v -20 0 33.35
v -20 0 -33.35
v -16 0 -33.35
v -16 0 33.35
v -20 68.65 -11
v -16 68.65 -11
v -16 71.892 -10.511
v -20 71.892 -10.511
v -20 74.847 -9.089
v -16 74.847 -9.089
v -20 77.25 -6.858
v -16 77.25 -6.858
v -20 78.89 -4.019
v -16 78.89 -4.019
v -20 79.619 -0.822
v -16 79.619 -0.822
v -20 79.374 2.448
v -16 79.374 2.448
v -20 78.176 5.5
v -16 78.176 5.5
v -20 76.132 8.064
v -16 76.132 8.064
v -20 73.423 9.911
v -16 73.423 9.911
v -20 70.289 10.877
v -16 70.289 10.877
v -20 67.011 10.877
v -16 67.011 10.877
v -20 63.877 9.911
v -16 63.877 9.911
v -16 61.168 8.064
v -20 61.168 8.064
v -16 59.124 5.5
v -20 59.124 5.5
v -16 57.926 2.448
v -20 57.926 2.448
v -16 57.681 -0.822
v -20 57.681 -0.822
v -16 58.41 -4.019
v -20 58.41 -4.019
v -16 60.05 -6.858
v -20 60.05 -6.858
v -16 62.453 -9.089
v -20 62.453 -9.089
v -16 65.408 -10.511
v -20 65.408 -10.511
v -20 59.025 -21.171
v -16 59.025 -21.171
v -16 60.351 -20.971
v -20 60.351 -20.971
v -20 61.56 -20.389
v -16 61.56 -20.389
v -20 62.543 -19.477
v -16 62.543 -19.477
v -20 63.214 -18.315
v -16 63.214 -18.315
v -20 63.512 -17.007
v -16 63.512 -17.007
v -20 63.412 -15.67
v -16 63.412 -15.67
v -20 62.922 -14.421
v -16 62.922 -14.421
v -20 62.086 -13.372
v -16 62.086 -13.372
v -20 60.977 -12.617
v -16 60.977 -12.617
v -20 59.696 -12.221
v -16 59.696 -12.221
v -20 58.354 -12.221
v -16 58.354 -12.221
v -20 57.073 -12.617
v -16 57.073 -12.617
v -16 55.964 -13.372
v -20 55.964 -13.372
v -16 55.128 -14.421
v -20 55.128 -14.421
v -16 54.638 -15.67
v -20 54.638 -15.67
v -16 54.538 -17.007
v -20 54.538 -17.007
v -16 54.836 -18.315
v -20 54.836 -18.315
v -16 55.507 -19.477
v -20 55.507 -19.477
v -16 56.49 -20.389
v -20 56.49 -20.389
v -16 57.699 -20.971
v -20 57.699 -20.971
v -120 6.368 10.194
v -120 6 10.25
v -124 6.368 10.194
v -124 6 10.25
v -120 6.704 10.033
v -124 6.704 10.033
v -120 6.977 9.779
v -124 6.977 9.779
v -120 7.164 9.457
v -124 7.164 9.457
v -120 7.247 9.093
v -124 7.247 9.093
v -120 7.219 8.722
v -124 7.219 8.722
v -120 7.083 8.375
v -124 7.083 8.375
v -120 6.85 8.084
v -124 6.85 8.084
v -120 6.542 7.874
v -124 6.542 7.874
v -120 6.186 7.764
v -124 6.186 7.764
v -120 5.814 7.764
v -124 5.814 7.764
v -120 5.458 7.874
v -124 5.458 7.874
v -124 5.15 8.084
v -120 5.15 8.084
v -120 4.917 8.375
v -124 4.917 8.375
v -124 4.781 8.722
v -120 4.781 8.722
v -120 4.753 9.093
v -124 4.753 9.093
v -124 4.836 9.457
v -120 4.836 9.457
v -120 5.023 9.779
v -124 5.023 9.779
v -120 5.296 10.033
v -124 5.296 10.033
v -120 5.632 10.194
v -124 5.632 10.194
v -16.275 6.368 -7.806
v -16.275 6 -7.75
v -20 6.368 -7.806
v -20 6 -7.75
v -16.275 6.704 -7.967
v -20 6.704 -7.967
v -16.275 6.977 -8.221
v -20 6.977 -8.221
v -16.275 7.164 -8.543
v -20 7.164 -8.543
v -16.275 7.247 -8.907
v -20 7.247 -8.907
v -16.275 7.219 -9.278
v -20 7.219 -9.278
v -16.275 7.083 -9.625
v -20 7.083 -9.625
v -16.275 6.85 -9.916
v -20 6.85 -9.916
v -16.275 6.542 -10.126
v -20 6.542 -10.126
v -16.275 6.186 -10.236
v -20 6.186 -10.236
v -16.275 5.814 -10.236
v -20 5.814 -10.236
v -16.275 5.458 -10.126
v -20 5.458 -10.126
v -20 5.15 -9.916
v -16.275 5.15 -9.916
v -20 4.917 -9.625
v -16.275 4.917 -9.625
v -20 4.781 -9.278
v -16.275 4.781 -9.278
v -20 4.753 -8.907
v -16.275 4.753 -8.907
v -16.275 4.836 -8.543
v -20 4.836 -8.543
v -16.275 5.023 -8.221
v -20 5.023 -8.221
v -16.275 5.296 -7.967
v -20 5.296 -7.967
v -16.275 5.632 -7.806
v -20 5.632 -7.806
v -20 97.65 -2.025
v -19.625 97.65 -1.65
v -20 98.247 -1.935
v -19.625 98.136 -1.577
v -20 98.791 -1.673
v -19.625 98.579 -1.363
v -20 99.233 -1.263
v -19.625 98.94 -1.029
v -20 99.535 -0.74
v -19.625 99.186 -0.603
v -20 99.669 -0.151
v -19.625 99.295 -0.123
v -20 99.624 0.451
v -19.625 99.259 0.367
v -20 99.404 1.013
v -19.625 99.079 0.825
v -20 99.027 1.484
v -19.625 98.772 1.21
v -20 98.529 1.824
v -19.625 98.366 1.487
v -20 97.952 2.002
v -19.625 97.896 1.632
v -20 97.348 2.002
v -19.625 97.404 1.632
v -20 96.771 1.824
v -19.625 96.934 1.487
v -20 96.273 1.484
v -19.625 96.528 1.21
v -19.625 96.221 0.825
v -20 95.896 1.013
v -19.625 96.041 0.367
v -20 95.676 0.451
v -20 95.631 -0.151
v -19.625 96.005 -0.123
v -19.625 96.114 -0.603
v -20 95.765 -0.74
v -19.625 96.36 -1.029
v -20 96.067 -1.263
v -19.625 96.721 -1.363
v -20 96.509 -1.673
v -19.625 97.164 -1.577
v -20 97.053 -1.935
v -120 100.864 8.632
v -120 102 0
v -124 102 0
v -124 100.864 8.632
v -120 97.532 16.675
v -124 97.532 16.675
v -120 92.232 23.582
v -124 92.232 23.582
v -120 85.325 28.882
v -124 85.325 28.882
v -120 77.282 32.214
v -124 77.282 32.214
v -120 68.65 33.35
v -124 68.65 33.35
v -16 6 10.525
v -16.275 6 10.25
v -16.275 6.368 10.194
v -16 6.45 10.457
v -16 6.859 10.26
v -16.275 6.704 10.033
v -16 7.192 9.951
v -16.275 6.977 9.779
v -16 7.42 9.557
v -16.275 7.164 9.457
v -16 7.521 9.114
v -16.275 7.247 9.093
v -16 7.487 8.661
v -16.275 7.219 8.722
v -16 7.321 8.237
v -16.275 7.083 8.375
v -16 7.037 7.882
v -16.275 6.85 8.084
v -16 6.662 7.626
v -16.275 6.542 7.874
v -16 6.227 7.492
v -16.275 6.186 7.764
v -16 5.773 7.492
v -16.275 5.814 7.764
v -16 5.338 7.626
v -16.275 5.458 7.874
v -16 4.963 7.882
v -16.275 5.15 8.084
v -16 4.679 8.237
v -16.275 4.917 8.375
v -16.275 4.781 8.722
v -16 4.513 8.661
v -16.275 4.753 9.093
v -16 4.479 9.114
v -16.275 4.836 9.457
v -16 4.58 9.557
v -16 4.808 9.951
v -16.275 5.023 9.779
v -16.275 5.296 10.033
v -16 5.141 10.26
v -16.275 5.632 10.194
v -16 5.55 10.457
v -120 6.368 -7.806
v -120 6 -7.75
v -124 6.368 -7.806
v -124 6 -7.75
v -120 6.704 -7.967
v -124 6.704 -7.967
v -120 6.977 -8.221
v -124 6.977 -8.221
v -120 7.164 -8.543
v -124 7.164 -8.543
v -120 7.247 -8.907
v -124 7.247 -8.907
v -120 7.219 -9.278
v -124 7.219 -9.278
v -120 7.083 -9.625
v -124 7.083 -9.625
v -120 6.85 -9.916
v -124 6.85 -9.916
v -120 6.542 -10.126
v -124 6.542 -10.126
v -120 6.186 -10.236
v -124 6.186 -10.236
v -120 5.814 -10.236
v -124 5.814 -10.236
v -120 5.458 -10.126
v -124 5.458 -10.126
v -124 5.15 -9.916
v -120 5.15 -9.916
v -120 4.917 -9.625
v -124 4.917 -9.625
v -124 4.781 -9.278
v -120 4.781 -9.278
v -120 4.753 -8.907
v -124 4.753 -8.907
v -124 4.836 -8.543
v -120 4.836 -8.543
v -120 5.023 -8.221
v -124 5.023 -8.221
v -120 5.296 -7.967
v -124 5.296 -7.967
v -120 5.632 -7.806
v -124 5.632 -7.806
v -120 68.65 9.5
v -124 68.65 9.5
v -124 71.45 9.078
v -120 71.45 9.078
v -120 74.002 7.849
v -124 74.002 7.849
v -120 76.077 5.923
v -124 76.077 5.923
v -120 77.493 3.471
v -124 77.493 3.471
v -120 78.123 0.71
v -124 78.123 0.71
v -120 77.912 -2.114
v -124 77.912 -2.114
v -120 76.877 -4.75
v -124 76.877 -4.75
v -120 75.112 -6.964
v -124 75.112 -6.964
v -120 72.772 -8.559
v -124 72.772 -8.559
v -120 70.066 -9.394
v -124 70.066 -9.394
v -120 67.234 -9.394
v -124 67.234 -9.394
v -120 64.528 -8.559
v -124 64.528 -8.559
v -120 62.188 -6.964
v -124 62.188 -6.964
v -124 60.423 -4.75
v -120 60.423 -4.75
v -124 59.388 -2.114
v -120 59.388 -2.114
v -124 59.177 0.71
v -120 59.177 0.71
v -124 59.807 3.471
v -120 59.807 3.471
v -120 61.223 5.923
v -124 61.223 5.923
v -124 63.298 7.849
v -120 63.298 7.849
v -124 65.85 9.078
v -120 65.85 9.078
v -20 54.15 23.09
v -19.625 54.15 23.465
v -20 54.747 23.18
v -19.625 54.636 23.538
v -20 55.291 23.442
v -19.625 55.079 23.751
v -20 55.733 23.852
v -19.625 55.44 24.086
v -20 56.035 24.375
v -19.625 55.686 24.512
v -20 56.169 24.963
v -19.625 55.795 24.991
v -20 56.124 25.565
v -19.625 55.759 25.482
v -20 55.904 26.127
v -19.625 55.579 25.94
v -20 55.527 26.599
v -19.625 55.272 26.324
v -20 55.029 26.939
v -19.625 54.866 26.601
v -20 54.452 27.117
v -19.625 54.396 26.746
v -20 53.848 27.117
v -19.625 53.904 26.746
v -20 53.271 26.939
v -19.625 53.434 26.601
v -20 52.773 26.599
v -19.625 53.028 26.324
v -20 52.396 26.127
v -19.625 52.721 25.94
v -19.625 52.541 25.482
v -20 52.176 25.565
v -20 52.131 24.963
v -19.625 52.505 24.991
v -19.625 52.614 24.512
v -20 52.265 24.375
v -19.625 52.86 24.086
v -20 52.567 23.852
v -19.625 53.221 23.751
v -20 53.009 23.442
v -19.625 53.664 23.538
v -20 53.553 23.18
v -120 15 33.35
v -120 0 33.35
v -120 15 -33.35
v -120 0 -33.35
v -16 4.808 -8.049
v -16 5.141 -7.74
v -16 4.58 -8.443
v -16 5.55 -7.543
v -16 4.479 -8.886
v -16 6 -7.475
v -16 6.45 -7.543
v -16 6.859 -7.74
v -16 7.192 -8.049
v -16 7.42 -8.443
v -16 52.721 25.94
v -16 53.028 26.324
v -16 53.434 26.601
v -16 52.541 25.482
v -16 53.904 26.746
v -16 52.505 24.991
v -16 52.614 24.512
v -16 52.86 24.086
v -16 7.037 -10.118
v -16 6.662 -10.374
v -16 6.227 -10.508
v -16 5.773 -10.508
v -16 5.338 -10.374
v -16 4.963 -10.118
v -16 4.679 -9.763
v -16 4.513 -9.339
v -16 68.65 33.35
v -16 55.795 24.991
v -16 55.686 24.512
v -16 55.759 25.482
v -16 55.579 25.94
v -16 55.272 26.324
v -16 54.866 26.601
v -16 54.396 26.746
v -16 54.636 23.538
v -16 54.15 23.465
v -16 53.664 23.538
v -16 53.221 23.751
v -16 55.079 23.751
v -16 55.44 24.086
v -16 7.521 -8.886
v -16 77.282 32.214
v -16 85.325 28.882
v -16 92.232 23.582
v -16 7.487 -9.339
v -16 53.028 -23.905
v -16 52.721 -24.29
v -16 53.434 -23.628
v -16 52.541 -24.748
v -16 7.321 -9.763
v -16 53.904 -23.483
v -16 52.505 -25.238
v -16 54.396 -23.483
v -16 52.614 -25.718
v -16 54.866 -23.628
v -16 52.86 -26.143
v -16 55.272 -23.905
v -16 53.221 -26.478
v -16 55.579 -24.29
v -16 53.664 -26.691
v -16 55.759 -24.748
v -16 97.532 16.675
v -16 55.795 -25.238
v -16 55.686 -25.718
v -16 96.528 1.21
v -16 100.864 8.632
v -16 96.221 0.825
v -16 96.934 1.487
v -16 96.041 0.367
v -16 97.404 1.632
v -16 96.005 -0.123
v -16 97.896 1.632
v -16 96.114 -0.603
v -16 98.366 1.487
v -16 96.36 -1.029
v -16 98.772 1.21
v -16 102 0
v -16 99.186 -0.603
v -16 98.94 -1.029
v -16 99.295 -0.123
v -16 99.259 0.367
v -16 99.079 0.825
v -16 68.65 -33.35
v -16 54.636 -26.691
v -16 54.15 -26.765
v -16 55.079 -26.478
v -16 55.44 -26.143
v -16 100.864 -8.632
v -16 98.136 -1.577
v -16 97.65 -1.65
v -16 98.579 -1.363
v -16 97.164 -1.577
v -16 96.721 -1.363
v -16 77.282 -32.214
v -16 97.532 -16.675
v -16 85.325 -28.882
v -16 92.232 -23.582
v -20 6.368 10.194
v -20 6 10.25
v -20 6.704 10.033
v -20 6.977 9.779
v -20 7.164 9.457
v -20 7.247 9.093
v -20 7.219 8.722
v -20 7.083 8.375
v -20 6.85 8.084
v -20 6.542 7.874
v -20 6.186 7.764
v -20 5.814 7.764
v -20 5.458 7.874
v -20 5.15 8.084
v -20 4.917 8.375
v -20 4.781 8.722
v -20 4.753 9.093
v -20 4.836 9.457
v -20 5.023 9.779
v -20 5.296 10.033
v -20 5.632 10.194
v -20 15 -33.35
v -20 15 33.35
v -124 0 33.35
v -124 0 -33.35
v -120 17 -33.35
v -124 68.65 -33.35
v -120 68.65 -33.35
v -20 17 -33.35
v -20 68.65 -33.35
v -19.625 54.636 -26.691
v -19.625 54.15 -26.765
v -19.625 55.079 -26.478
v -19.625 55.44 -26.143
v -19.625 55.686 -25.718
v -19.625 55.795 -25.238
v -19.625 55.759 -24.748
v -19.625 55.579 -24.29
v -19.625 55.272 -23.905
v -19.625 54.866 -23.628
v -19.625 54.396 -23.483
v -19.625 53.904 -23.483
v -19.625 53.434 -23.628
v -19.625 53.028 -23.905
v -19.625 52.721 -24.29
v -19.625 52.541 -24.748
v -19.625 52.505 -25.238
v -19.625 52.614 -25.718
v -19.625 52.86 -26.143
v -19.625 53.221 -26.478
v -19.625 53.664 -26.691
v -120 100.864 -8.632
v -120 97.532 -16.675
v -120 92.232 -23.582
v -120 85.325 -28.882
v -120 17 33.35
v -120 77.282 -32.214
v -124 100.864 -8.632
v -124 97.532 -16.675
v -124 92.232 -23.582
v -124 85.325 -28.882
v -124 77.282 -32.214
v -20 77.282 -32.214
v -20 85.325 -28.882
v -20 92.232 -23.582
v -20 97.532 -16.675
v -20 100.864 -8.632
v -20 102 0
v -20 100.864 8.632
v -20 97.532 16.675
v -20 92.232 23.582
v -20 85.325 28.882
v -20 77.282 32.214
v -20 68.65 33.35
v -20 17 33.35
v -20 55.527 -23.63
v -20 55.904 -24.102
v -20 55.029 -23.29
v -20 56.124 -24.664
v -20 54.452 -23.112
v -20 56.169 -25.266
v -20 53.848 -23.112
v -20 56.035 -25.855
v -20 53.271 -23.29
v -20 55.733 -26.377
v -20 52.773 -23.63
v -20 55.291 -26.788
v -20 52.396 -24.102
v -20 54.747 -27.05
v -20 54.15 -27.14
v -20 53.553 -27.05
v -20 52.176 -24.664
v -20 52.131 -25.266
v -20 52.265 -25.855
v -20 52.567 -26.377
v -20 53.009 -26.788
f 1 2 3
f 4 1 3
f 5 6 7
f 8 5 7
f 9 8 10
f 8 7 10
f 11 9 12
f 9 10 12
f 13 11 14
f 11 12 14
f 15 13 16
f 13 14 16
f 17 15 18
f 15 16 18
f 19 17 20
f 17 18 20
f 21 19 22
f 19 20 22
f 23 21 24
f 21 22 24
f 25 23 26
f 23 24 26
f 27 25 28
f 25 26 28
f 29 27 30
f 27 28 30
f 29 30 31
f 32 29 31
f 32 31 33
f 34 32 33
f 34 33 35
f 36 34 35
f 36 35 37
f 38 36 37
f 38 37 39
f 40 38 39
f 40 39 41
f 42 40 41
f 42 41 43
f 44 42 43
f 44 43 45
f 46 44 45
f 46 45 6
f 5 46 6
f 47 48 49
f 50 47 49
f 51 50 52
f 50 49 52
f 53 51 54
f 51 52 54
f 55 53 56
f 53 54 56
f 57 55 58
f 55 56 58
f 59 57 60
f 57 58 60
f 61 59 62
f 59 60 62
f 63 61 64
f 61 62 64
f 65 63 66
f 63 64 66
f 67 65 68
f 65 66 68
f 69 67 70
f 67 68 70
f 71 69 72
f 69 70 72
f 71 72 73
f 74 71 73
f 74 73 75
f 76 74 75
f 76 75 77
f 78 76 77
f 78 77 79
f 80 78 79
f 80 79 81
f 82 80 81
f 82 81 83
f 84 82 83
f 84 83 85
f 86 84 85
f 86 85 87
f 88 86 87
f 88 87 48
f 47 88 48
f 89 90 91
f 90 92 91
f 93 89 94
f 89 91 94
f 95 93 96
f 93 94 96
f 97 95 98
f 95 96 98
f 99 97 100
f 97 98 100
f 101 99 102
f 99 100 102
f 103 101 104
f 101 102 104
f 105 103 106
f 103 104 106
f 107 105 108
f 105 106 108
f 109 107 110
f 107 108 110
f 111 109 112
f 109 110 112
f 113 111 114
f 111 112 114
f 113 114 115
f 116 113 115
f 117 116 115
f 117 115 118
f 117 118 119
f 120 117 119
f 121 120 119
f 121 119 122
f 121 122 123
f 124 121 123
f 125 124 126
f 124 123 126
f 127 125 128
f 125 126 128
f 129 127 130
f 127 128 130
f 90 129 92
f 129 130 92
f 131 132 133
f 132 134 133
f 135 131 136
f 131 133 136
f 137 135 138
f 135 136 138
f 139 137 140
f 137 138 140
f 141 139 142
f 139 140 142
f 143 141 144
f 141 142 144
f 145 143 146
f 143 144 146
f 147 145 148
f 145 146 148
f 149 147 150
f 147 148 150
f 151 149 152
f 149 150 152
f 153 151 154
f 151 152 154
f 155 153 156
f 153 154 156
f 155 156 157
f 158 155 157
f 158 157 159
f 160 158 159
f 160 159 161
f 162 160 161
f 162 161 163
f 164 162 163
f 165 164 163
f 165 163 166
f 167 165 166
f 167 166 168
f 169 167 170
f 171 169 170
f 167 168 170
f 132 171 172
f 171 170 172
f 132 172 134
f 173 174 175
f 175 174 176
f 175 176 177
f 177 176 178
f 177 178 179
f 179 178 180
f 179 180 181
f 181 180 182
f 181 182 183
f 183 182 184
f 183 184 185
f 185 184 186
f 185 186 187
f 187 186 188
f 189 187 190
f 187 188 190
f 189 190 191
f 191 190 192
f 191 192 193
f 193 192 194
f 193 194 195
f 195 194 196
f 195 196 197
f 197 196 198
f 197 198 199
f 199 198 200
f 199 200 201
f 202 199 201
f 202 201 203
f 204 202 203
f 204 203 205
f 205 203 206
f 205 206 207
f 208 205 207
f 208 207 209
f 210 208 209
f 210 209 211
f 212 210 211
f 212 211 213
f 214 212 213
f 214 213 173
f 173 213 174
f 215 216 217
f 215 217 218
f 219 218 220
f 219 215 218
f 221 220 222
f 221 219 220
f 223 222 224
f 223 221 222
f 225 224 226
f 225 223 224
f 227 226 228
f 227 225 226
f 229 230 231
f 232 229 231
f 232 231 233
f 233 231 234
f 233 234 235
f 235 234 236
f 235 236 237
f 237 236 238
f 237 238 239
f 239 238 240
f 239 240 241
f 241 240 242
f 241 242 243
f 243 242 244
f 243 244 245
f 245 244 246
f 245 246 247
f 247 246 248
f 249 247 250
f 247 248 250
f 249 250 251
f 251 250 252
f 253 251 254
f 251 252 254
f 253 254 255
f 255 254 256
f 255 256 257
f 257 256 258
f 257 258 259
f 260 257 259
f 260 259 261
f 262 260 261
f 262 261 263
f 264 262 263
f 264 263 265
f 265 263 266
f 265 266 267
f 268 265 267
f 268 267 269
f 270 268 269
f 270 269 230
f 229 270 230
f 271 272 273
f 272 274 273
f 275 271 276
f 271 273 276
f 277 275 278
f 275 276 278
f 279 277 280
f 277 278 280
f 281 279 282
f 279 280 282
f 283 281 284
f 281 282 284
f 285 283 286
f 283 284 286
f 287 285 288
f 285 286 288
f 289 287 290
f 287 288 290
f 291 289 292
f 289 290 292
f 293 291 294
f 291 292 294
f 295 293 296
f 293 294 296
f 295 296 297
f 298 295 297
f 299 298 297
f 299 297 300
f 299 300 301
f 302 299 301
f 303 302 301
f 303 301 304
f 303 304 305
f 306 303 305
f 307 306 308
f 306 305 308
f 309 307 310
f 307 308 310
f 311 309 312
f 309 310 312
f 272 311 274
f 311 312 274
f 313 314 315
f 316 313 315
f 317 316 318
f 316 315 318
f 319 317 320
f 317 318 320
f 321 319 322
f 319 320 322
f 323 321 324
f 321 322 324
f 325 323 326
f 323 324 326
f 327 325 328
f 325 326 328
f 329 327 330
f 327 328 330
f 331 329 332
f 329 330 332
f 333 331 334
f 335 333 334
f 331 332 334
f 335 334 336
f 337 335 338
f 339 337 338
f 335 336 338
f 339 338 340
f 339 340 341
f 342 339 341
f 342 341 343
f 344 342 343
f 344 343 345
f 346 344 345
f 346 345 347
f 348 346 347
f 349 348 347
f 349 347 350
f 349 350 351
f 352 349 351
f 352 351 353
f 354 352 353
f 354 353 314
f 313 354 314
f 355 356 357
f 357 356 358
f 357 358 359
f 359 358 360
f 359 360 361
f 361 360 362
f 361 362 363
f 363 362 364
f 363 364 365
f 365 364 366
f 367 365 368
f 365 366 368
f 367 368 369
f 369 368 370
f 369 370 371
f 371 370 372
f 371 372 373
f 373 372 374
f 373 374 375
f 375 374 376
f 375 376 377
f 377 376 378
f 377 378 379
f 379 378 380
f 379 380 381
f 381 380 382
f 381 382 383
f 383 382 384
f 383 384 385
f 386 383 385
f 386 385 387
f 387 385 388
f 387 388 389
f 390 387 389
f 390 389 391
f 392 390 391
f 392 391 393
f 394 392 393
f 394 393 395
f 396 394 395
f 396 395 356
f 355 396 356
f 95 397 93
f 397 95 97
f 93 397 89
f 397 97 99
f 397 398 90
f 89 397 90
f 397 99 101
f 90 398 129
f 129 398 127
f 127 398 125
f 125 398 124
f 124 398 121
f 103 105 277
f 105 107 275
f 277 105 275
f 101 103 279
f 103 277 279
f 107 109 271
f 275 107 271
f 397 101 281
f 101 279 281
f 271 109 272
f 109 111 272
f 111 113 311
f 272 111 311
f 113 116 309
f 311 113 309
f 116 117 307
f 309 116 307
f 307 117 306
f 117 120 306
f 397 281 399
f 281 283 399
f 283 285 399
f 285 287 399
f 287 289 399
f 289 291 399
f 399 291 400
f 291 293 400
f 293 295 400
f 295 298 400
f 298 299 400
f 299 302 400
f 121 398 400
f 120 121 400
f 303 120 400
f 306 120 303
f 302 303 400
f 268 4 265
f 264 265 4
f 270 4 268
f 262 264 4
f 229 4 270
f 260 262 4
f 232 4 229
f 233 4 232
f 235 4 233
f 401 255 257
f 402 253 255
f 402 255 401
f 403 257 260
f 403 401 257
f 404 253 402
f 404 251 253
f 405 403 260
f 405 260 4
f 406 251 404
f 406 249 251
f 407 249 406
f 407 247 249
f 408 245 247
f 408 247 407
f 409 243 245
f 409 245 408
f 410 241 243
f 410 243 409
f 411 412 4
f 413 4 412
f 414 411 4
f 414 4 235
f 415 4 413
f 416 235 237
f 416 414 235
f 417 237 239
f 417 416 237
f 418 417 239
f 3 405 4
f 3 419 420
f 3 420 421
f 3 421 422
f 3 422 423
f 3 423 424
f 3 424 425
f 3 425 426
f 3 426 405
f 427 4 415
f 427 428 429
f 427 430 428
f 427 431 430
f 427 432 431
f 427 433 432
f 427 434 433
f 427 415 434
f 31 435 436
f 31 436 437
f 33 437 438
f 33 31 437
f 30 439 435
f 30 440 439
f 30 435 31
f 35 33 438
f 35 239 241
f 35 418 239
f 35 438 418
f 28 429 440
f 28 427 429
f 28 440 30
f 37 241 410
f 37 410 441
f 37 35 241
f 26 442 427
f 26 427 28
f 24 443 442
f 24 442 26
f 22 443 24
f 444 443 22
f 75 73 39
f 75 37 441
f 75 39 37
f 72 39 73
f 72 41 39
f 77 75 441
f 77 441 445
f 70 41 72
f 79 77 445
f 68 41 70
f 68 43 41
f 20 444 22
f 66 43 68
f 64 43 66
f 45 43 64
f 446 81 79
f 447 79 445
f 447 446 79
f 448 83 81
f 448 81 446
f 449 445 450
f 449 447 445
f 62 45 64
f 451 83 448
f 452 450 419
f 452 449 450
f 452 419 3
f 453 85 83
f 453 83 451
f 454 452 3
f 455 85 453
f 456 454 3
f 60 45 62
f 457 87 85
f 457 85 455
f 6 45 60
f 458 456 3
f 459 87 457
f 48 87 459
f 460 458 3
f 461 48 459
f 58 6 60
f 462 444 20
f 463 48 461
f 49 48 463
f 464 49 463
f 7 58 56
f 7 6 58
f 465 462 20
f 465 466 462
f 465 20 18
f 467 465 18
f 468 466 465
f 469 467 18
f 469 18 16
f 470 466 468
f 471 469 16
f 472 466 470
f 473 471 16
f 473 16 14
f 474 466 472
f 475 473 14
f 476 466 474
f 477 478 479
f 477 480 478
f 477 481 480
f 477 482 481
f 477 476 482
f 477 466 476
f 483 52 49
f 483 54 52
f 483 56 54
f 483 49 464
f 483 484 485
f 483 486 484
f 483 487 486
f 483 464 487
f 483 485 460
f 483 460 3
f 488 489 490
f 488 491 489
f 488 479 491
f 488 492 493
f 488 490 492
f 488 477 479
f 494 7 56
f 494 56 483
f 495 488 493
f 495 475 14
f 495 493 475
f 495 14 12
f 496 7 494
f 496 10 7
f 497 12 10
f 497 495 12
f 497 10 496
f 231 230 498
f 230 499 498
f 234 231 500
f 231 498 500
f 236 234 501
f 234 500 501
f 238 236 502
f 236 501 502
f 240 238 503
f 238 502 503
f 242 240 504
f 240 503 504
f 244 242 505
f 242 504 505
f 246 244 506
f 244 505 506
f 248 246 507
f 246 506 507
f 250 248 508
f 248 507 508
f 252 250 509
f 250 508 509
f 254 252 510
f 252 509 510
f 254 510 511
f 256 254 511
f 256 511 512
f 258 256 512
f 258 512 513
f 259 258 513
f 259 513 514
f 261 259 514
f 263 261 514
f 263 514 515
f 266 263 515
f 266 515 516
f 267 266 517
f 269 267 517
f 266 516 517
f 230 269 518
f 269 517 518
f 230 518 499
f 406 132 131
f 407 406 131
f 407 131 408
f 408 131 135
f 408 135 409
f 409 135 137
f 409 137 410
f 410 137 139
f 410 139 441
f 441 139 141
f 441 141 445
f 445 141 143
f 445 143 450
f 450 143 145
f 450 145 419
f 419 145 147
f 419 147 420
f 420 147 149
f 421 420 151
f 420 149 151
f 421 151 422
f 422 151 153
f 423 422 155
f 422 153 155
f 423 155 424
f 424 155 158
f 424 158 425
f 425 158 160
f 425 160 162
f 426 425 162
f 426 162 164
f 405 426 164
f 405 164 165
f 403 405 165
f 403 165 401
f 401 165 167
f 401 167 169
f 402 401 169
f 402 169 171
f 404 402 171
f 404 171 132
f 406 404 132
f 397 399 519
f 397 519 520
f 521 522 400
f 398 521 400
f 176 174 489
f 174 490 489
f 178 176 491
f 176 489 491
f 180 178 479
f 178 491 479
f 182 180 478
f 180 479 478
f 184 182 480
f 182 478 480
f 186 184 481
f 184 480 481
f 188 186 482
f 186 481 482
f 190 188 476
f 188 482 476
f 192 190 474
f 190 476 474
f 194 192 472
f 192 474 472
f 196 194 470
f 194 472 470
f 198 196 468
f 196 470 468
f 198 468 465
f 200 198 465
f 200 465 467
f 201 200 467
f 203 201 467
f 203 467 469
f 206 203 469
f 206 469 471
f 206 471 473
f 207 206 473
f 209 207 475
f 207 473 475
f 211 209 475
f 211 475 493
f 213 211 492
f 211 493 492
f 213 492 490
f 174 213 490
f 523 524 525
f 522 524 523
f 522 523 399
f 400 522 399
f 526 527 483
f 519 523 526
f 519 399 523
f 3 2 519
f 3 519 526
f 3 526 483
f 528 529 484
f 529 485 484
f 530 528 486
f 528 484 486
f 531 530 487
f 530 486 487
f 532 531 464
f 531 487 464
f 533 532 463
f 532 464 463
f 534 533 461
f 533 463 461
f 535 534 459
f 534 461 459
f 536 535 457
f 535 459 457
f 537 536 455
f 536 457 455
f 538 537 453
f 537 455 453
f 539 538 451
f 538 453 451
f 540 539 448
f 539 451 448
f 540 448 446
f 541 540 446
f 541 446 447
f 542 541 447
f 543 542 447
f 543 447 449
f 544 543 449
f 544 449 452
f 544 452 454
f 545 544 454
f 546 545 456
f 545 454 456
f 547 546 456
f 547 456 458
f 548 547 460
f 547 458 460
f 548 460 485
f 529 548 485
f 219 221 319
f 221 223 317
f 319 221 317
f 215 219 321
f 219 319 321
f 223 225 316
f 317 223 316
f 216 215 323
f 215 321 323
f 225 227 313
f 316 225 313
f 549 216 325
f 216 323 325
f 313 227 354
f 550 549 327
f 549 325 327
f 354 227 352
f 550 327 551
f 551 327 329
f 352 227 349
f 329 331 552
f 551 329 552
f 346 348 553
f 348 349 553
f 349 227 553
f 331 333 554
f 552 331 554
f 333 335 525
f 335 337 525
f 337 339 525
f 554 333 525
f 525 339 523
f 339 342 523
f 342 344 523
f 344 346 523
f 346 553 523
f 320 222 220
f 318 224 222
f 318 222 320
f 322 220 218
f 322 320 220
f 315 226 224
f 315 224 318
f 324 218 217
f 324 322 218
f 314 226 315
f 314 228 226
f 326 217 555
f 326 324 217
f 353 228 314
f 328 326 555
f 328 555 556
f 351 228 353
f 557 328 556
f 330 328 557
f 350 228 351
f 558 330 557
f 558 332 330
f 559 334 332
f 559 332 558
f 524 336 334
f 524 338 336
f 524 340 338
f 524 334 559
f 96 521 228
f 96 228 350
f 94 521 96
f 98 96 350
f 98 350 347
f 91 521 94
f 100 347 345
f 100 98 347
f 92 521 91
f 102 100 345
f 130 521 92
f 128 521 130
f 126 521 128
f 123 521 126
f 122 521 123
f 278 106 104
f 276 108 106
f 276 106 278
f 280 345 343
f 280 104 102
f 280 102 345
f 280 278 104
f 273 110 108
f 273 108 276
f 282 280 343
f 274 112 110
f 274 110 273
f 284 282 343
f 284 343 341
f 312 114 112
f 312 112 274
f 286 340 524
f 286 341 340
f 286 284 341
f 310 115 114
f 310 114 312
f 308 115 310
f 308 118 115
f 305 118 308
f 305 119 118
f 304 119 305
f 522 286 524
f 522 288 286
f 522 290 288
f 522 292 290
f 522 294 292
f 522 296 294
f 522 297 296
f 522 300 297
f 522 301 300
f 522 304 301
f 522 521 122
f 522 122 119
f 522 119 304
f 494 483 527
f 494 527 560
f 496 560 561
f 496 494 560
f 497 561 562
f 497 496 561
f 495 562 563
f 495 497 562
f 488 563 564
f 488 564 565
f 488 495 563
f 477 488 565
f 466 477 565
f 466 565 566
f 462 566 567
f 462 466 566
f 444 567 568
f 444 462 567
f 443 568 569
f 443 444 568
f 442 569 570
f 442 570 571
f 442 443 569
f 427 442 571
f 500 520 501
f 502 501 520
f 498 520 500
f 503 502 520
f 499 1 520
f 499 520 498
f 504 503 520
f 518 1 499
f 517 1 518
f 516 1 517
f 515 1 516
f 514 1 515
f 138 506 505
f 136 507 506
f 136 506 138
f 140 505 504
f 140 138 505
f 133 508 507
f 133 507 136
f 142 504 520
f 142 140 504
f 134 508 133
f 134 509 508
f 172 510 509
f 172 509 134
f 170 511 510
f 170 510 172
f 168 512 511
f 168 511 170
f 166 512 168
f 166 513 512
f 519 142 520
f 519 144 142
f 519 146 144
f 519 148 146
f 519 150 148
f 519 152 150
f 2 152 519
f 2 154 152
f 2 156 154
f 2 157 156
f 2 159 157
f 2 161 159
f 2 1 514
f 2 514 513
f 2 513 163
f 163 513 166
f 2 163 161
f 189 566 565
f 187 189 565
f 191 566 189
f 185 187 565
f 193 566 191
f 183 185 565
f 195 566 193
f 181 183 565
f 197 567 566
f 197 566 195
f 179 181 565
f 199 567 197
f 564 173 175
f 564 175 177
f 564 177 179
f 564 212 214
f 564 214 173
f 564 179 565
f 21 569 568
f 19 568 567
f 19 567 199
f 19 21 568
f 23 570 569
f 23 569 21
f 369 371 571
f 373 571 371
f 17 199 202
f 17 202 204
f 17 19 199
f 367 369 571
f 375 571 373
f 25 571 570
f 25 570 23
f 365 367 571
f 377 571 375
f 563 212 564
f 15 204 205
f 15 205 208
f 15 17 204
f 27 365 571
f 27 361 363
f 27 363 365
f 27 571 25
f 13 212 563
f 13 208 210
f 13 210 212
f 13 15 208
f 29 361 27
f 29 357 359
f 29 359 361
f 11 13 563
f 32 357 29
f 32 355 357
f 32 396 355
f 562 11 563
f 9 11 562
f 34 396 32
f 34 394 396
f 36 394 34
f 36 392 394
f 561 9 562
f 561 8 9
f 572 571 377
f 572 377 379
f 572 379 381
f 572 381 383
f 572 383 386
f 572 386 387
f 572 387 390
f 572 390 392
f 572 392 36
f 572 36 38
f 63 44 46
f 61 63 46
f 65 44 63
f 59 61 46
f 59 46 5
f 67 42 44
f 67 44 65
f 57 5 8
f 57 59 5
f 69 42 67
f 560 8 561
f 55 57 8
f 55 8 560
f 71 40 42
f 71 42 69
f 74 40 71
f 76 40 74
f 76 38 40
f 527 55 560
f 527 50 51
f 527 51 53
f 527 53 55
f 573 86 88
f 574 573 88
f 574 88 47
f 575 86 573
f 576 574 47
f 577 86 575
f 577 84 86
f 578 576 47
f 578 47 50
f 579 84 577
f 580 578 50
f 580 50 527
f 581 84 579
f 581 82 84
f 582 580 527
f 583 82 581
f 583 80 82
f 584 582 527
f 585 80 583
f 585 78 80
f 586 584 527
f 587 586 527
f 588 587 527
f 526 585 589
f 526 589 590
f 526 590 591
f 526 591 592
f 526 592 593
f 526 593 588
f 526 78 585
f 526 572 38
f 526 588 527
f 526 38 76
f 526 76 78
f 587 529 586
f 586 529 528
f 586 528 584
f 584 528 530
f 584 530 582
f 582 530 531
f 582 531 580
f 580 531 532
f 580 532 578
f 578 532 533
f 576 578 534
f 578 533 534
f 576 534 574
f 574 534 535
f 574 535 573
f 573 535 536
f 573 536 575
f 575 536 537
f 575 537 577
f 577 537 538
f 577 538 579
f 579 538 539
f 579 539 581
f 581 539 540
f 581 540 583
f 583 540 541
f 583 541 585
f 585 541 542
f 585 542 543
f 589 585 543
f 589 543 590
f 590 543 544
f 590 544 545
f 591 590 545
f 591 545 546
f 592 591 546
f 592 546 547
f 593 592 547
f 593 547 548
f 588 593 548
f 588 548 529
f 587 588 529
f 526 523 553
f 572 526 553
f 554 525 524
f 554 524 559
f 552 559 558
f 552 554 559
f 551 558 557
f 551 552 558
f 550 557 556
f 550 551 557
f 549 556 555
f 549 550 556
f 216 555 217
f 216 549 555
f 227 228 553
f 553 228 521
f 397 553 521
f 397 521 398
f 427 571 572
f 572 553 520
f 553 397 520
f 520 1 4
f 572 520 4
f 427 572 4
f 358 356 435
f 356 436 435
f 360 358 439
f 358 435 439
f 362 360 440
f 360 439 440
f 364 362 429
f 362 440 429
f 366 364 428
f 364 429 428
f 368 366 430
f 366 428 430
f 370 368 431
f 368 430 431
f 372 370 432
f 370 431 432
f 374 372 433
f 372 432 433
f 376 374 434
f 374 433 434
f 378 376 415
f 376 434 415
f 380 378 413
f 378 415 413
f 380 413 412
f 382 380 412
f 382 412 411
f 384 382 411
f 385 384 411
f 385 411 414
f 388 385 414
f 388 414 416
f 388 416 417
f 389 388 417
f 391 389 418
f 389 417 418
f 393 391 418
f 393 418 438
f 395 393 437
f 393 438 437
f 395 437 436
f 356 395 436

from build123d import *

# Parameters (mm, degrees)
SKETCH_1_W                   = 40
SKETCH_1_H                   = 66.7
EXTRUDE_1_DEPTH              = 2
SKETCH_2_W                   = 4
SKETCH_2_H                   = 66.7
EXTRUDE_2_DEPTH              = 100
CUT_EXTRUDE_1_DEPTH          = 115.526077816
CUT_EXTRUDE_1_DEPTH_BACK     = 115.526077816
HOLE_WIZARD_M4_1_D           = 3.3
HOLE_WIZARD_M4_1_CSINK_D     = 4.05
HOLE_WIZARD_M4_1_CSINK_ANGLE = 90
HOLE_WIZARD_M4_2_AT_2_COUNT  = 2
HOLE_WIZARD_M4_2_AT_2_PITCH  = 68.59294731
HOLE_WIZARD_M4_2_AT_3_COUNT  = 2
HOLE_WIZARD_M4_2_AT_3_PITCH  = 26
HOLE_WIZARD_M4_2_AT_4_COUNT  = 2
HOLE_WIZARD_M4_2_AT_4_PITCH  = 62.376998966
HOLE_WIZARD_M4_2_AT_5_COUNT  = 2
HOLE_WIZARD_M4_2_AT_5_PITCH  = 56.7
SKETCH_11_W                  = 66.7
SKETCH_11_H                  = 2
EXTRUDE_3_DEPTH              = 100
SKETCH_13_W                  = 40
SKETCH_13_H                  = 66.7
EXTRUDE_4_DEPTH              = 2
SKETCH_14_W                  = 4
SKETCH_14_H                  = 66.7
EXTRUDE_5_DEPTH              = 100
CUT_EXTRUDE_2_DEPTH          = 180.589037806
CUT_EXTRUDE_2_DEPTH_BACK     = 180.589037806
HOLE_WIZARD_M4_3_AT_2_COUNT  = 2
HOLE_WIZARD_M4_3_AT_2_PITCH  = 26
HOLE_WIZARD_M4_3_AT_3_COUNT  = 2
HOLE_WIZARD_M4_3_AT_3_PITCH  = 62.376998966
HOLE_WIZARD_M4_3_AT_4_COUNT  = 2
HOLE_WIZARD_M4_3_AT_4_PITCH  = 56.7
CUT_EXTRUDE_3_REACH          = 181.589
SKETCH_18_R                  = 9.5
CUT_EXTRUDE_4_REACH          = 181.589
SKETCH_21_R                  = 11
CUT_EXTRUDE_5_REACH          = 181.589
SKETCH_22_R                  = 4.5
FILLET_1_R                   = 2
CUT_EXTRUDE_6_REACH          = 193.604
SKETCH_23_W                  = 36
SKETCH_23_H                  = 66.7
CUT_EXTRUDE_7_REACH          = 164.752
SKETCH_24_W                  = 36
SKETCH_24_H                  = 66.7
HOLE_WIZARD_M3_1_D           = 2.5
HOLE_WIZARD_M3_1_CSINK_D     = 3.05
HOLE_WIZARD_M3_1_CSINK_ANGLE = 90


with BuildPart() as part:
    # 草图1 → 凸台-拉伸1 (new body)
    with BuildSketch(Plane(origin=(0, 0, 0), x_dir=(1, 0, 0), z_dir=(0, 1, 0))):
        Rectangle(SKETCH_1_W, SKETCH_1_H)
    extrude(amount=EXTRUDE_1_DEPTH)

    # 草图2 → 凸台-拉伸2 (add)
    with BuildSketch(Plane(origin=(0, 2, 0), x_dir=(1, 0, 0), z_dir=(0, 1, 0))):
        with Locations((-18, 0)):
            Rectangle(SKETCH_2_W, SKETCH_2_H)
    extrude(amount=EXTRUDE_2_DEPTH)

    # 草图5 → 切除-拉伸1 (cut, two sides: drawn at the far end of the back side and taken through both)
    with BuildSketch(Plane.ZY.offset(20).offset(-CUT_EXTRUDE_1_DEPTH_BACK)):
        with BuildLine():
            ThreePointArc((0, 102), (23.582011153, 92.232011153), (33.35, 68.65))
            Line((33.35, 68.65), (33.35, 102))
            Line((33.35, 102), (0, 102))
        make_face()
        with BuildLine():
            ThreePointArc((-33.35, 68.65), (-23.582011153, 92.232011153), (0, 102))
            Line((0, 102), (-33.35, 102))
            Line((-33.35, 102), (-33.35, 68.65))
        make_face()
    extrude(amount=CUT_EXTRUDE_1_DEPTH + CUT_EXTRUDE_1_DEPTH_BACK, mode=Mode.SUBTRACT)

    # M4 螺纹孔1 (through all)
    with Locations(Plane.ZY.offset(20)):
        with Locations((0, 97.65), (25.11473671, 54.15), (-25.11473671, 54.15)):
            CounterSinkHole(HOLE_WIZARD_M4_1_D / 2, HOLE_WIZARD_M4_1_CSINK_D / 2, counter_sink_angle=HOLE_WIZARD_M4_1_CSINK_ANGLE)

    # 草图10 → M4 螺纹孔2 (revolve, cut)
    with BuildSketch(Plane(origin=(15, 2, -28.35), x_dir=(0, 0, 1), z_dir=(1, 0, 0))):
        Polygon((0, 0), (0, 2), (1.65, 2), (1.65, 0.375), (2.025, 0), align=None)
    hole_wizard_m4_2 = revolve(axis=Axis((15, 8.35, -28.35), (0, -1, 0)), mode=Mode.SUBTRACT)

    # M4 螺纹孔2 at 2: M4 螺纹孔2 ×2
    with Locations(*[Vector(-0.9508085645250022, 0, 0.3097790722852413) * (i * HOLE_WIZARD_M4_2_AT_2_PITCH) for i in range(1, HOLE_WIZARD_M4_2_AT_2_COUNT)]):
        add(hole_wizard_m4_2, mode=Mode.SUBTRACT)

    # M4 螺纹孔2 at 3: M4 螺纹孔2 ×2
    with Locations(*[(-i * HOLE_WIZARD_M4_2_AT_3_PITCH, 0, 0) for i in range(1, HOLE_WIZARD_M4_2_AT_3_COUNT)]):
        add(hole_wizard_m4_2, mode=Mode.SUBTRACT)

    # M4 螺纹孔2 at 4: M4 螺纹孔2 ×2
    with Locations(*[Vector(-0.4168203092647413, 0, 0.9089889052042635) * (i * HOLE_WIZARD_M4_2_AT_4_PITCH) for i in range(1, HOLE_WIZARD_M4_2_AT_4_COUNT)]):
        add(hole_wizard_m4_2, mode=Mode.SUBTRACT)

    # M4 螺纹孔2 at 5: M4 螺纹孔2 ×2
    with Locations(*[(0, 0, i * HOLE_WIZARD_M4_2_AT_5_PITCH) for i in range(1, HOLE_WIZARD_M4_2_AT_5_COUNT)]):
        add(hole_wizard_m4_2, mode=Mode.SUBTRACT)

    # 草图11 → 凸台-拉伸3 (add)
    with BuildSketch(Plane.ZY.offset(20)):
        with Locations((0, 16)):
            Rectangle(SKETCH_11_W, SKETCH_11_H)
    extrude(amount=EXTRUDE_3_DEPTH)



with BuildPart() as body_2:
    # 草图13 → 凸台-拉伸4 (new body)
    with BuildSketch(Plane(origin=(0, 0, 0), x_dir=(1, 0, 0), z_dir=(0, 1, 0))):
        with Locations((-140, 0)):
            Rectangle(SKETCH_13_W, SKETCH_13_H)
    extrude(amount=EXTRUDE_4_DEPTH)


with BuildPart() as part_1:
    add(part.part)

    add(body_2.part)  # 凸台-拉伸5 merges body 2
    # 草图14 → 凸台-拉伸5 (add)
    with BuildSketch(Plane(origin=(0, 2, 0), x_dir=(1, 0, 0), z_dir=(0, 1, 0))):
        with Locations((-122, 0)):
            Rectangle(SKETCH_14_W, SKETCH_14_H)
    extrude(amount=EXTRUDE_5_DEPTH)

    # 草图15 → 切除-拉伸2 (cut, two sides: drawn at the far end of the back side and taken through both)
    with BuildSketch(Plane.ZY.offset(124).offset(-CUT_EXTRUDE_2_DEPTH_BACK)):
        with BuildLine():
            ThreePointArc((0, 102), (23.582011153, 92.232011153), (33.35, 68.65))
            Line((33.35, 68.65), (33.35, 102))
            Line((33.35, 102), (0, 102))
        make_face()
        with BuildLine():
            ThreePointArc((-33.35, 68.65), (-23.582011153, 92.232011153), (0, 102))
            Line((0, 102), (-33.35, 102))
            Line((-33.35, 102), (-33.35, 68.65))
        make_face()
    extrude(amount=CUT_EXTRUDE_2_DEPTH + CUT_EXTRUDE_2_DEPTH_BACK, mode=Mode.SUBTRACT)

    # 草图17 → M4 螺纹孔3 (revolve, cut)
    with BuildSketch(Plane(origin=(-129, 2, -28.35), x_dir=(0, 0, 1), z_dir=(1, 0, 0))):
        Polygon((0, 0), (0, 2), (1.65, 2), (1.65, 0.375), (2.025, 0), align=None)
    hole_wizard_m4_3 = revolve(axis=Axis((-129, 8.35, -28.35), (0, -1, 0)), mode=Mode.SUBTRACT)

    # M4 螺纹孔3 at 2: M4 螺纹孔3 ×2
    with Locations(*[(-i * HOLE_WIZARD_M4_3_AT_2_PITCH, 0, 0) for i in range(1, HOLE_WIZARD_M4_3_AT_2_COUNT)]):
        add(hole_wizard_m4_3, mode=Mode.SUBTRACT)

    # M4 螺纹孔3 at 3: M4 螺纹孔3 ×2
    with Locations(*[Vector(-0.41682030926474106, 0, 0.9089889052042636) * (i * HOLE_WIZARD_M4_3_AT_3_PITCH) for i in range(1, HOLE_WIZARD_M4_3_AT_3_COUNT)]):
        add(hole_wizard_m4_3, mode=Mode.SUBTRACT)

    # M4 螺纹孔3 at 4: M4 螺纹孔3 ×2
    with Locations(*[(0, 0, i * HOLE_WIZARD_M4_3_AT_4_PITCH) for i in range(1, HOLE_WIZARD_M4_3_AT_4_COUNT)]):
        add(hole_wizard_m4_3, mode=Mode.SUBTRACT)

    # 草图18 → 切除-拉伸3 (cut, up to next)
    with BuildSketch(Plane.ZY.offset(124), mode=Mode.PRIVATE) as cut_extrude_3_sk1:
        with Locations((0, 68.65)):
            Circle(SKETCH_18_R)
    cut_extrude_3_tool1 = extrude(cut_extrude_3_sk1.sketch, amount=-CUT_EXTRUDE_3_REACH, mode=Mode.PRIVATE) & part_1.part
    add(cut_extrude_3_tool1.solids().sort_by_distance((-124, 68.65, 0))[0], mode=Mode.SUBTRACT)

    # 草图21 → 切除-拉伸4 (cut, up to next)
    with BuildSketch(Plane(origin=(-16, 0, 0), x_dir=(0, 0, -1), z_dir=(1, 0, 0)), mode=Mode.PRIVATE) as cut_extrude_4_sk1:
        with Locations((0, 68.65)):
            Circle(SKETCH_21_R)
    cut_extrude_4_tool1 = extrude(cut_extrude_4_sk1.sketch, amount=-CUT_EXTRUDE_4_REACH, mode=Mode.PRIVATE) & part_1.part
    add(cut_extrude_4_tool1.solids().sort_by_distance((-16, 68.65, 0))[0], mode=Mode.SUBTRACT)

    # 草图22 → 切除-拉伸5 (cut, up to next)
    with BuildSketch(Plane(origin=(-16, 0, 0), x_dir=(0, 0, -1), z_dir=(1, 0, 0)), mode=Mode.PRIVATE) as cut_extrude_5_sk1:
        with Locations((16.670989023, 59.025)):
            Circle(SKETCH_22_R)
    cut_extrude_5_tool1 = extrude(cut_extrude_5_sk1.sketch, amount=-CUT_EXTRUDE_5_REACH, mode=Mode.PRIVATE) & part_1.part
    add(cut_extrude_5_tool1.solids().sort_by_distance((-16, 59.025, -16.670989))[0], mode=Mode.SUBTRACT)

    # 圆角1
    fillet_1_edges = [part_1.edges().sort_by_distance(p)[0] for p in [
        (-160, 1, -33.35),
        (-160, 1, 33.35),
        (20, 1, 33.35),
        (20, 1, -33.35),
    ]]
    fillet(fillet_1_edges, radius=FILLET_1_R)

    # 草图23 → 切除-拉伸6 (cut, up to next)
    with BuildSketch(Plane(origin=(0, 2, 0), x_dir=(1, 0, 0), z_dir=(0, 1, 0)), mode=Mode.PRIVATE) as cut_extrude_6_sk1:
        with Locations((-142, 0)):
            Rectangle(SKETCH_23_W, SKETCH_23_H)
    cut_extrude_6_tool1 = extrude(cut_extrude_6_sk1.sketch, amount=-CUT_EXTRUDE_6_REACH, mode=Mode.PRIVATE) & part_1.part
    add(cut_extrude_6_tool1.solids().sort_by_distance((-142, 2, 0))[0], mode=Mode.SUBTRACT)

    # 草图24 → 切除-拉伸7 (cut, up to next)
    with BuildSketch(Plane(origin=(0, 2, 0), x_dir=(1, 0, 0), z_dir=(0, 1, 0)), mode=Mode.PRIVATE) as cut_extrude_7_sk1:
        with Locations((2, 0)):
            Rectangle(SKETCH_24_W, SKETCH_24_H)
    cut_extrude_7_tool1 = extrude(cut_extrude_7_sk1.sketch, amount=-CUT_EXTRUDE_7_REACH, mode=Mode.PRIVATE) & part_1.part
    add(cut_extrude_7_tool1.solids().sort_by_distance((2, 2, 0))[0], mode=Mode.SUBTRACT)

    # M3 螺纹孔1 (through all)
    with Locations(Plane(origin=(-16, 0, 0), x_dir=(0, 0, -1), z_dir=(1, 0, 0))):
        with Locations((9, 6), (-9, 6)):
            CounterSinkHole(HOLE_WIZARD_M3_1_D / 2, HOLE_WIZARD_M3_1_CSINK_D / 2, counter_sink_angle=HOLE_WIZARD_M3_1_CSINK_ANGLE)


solid = part_1.part
